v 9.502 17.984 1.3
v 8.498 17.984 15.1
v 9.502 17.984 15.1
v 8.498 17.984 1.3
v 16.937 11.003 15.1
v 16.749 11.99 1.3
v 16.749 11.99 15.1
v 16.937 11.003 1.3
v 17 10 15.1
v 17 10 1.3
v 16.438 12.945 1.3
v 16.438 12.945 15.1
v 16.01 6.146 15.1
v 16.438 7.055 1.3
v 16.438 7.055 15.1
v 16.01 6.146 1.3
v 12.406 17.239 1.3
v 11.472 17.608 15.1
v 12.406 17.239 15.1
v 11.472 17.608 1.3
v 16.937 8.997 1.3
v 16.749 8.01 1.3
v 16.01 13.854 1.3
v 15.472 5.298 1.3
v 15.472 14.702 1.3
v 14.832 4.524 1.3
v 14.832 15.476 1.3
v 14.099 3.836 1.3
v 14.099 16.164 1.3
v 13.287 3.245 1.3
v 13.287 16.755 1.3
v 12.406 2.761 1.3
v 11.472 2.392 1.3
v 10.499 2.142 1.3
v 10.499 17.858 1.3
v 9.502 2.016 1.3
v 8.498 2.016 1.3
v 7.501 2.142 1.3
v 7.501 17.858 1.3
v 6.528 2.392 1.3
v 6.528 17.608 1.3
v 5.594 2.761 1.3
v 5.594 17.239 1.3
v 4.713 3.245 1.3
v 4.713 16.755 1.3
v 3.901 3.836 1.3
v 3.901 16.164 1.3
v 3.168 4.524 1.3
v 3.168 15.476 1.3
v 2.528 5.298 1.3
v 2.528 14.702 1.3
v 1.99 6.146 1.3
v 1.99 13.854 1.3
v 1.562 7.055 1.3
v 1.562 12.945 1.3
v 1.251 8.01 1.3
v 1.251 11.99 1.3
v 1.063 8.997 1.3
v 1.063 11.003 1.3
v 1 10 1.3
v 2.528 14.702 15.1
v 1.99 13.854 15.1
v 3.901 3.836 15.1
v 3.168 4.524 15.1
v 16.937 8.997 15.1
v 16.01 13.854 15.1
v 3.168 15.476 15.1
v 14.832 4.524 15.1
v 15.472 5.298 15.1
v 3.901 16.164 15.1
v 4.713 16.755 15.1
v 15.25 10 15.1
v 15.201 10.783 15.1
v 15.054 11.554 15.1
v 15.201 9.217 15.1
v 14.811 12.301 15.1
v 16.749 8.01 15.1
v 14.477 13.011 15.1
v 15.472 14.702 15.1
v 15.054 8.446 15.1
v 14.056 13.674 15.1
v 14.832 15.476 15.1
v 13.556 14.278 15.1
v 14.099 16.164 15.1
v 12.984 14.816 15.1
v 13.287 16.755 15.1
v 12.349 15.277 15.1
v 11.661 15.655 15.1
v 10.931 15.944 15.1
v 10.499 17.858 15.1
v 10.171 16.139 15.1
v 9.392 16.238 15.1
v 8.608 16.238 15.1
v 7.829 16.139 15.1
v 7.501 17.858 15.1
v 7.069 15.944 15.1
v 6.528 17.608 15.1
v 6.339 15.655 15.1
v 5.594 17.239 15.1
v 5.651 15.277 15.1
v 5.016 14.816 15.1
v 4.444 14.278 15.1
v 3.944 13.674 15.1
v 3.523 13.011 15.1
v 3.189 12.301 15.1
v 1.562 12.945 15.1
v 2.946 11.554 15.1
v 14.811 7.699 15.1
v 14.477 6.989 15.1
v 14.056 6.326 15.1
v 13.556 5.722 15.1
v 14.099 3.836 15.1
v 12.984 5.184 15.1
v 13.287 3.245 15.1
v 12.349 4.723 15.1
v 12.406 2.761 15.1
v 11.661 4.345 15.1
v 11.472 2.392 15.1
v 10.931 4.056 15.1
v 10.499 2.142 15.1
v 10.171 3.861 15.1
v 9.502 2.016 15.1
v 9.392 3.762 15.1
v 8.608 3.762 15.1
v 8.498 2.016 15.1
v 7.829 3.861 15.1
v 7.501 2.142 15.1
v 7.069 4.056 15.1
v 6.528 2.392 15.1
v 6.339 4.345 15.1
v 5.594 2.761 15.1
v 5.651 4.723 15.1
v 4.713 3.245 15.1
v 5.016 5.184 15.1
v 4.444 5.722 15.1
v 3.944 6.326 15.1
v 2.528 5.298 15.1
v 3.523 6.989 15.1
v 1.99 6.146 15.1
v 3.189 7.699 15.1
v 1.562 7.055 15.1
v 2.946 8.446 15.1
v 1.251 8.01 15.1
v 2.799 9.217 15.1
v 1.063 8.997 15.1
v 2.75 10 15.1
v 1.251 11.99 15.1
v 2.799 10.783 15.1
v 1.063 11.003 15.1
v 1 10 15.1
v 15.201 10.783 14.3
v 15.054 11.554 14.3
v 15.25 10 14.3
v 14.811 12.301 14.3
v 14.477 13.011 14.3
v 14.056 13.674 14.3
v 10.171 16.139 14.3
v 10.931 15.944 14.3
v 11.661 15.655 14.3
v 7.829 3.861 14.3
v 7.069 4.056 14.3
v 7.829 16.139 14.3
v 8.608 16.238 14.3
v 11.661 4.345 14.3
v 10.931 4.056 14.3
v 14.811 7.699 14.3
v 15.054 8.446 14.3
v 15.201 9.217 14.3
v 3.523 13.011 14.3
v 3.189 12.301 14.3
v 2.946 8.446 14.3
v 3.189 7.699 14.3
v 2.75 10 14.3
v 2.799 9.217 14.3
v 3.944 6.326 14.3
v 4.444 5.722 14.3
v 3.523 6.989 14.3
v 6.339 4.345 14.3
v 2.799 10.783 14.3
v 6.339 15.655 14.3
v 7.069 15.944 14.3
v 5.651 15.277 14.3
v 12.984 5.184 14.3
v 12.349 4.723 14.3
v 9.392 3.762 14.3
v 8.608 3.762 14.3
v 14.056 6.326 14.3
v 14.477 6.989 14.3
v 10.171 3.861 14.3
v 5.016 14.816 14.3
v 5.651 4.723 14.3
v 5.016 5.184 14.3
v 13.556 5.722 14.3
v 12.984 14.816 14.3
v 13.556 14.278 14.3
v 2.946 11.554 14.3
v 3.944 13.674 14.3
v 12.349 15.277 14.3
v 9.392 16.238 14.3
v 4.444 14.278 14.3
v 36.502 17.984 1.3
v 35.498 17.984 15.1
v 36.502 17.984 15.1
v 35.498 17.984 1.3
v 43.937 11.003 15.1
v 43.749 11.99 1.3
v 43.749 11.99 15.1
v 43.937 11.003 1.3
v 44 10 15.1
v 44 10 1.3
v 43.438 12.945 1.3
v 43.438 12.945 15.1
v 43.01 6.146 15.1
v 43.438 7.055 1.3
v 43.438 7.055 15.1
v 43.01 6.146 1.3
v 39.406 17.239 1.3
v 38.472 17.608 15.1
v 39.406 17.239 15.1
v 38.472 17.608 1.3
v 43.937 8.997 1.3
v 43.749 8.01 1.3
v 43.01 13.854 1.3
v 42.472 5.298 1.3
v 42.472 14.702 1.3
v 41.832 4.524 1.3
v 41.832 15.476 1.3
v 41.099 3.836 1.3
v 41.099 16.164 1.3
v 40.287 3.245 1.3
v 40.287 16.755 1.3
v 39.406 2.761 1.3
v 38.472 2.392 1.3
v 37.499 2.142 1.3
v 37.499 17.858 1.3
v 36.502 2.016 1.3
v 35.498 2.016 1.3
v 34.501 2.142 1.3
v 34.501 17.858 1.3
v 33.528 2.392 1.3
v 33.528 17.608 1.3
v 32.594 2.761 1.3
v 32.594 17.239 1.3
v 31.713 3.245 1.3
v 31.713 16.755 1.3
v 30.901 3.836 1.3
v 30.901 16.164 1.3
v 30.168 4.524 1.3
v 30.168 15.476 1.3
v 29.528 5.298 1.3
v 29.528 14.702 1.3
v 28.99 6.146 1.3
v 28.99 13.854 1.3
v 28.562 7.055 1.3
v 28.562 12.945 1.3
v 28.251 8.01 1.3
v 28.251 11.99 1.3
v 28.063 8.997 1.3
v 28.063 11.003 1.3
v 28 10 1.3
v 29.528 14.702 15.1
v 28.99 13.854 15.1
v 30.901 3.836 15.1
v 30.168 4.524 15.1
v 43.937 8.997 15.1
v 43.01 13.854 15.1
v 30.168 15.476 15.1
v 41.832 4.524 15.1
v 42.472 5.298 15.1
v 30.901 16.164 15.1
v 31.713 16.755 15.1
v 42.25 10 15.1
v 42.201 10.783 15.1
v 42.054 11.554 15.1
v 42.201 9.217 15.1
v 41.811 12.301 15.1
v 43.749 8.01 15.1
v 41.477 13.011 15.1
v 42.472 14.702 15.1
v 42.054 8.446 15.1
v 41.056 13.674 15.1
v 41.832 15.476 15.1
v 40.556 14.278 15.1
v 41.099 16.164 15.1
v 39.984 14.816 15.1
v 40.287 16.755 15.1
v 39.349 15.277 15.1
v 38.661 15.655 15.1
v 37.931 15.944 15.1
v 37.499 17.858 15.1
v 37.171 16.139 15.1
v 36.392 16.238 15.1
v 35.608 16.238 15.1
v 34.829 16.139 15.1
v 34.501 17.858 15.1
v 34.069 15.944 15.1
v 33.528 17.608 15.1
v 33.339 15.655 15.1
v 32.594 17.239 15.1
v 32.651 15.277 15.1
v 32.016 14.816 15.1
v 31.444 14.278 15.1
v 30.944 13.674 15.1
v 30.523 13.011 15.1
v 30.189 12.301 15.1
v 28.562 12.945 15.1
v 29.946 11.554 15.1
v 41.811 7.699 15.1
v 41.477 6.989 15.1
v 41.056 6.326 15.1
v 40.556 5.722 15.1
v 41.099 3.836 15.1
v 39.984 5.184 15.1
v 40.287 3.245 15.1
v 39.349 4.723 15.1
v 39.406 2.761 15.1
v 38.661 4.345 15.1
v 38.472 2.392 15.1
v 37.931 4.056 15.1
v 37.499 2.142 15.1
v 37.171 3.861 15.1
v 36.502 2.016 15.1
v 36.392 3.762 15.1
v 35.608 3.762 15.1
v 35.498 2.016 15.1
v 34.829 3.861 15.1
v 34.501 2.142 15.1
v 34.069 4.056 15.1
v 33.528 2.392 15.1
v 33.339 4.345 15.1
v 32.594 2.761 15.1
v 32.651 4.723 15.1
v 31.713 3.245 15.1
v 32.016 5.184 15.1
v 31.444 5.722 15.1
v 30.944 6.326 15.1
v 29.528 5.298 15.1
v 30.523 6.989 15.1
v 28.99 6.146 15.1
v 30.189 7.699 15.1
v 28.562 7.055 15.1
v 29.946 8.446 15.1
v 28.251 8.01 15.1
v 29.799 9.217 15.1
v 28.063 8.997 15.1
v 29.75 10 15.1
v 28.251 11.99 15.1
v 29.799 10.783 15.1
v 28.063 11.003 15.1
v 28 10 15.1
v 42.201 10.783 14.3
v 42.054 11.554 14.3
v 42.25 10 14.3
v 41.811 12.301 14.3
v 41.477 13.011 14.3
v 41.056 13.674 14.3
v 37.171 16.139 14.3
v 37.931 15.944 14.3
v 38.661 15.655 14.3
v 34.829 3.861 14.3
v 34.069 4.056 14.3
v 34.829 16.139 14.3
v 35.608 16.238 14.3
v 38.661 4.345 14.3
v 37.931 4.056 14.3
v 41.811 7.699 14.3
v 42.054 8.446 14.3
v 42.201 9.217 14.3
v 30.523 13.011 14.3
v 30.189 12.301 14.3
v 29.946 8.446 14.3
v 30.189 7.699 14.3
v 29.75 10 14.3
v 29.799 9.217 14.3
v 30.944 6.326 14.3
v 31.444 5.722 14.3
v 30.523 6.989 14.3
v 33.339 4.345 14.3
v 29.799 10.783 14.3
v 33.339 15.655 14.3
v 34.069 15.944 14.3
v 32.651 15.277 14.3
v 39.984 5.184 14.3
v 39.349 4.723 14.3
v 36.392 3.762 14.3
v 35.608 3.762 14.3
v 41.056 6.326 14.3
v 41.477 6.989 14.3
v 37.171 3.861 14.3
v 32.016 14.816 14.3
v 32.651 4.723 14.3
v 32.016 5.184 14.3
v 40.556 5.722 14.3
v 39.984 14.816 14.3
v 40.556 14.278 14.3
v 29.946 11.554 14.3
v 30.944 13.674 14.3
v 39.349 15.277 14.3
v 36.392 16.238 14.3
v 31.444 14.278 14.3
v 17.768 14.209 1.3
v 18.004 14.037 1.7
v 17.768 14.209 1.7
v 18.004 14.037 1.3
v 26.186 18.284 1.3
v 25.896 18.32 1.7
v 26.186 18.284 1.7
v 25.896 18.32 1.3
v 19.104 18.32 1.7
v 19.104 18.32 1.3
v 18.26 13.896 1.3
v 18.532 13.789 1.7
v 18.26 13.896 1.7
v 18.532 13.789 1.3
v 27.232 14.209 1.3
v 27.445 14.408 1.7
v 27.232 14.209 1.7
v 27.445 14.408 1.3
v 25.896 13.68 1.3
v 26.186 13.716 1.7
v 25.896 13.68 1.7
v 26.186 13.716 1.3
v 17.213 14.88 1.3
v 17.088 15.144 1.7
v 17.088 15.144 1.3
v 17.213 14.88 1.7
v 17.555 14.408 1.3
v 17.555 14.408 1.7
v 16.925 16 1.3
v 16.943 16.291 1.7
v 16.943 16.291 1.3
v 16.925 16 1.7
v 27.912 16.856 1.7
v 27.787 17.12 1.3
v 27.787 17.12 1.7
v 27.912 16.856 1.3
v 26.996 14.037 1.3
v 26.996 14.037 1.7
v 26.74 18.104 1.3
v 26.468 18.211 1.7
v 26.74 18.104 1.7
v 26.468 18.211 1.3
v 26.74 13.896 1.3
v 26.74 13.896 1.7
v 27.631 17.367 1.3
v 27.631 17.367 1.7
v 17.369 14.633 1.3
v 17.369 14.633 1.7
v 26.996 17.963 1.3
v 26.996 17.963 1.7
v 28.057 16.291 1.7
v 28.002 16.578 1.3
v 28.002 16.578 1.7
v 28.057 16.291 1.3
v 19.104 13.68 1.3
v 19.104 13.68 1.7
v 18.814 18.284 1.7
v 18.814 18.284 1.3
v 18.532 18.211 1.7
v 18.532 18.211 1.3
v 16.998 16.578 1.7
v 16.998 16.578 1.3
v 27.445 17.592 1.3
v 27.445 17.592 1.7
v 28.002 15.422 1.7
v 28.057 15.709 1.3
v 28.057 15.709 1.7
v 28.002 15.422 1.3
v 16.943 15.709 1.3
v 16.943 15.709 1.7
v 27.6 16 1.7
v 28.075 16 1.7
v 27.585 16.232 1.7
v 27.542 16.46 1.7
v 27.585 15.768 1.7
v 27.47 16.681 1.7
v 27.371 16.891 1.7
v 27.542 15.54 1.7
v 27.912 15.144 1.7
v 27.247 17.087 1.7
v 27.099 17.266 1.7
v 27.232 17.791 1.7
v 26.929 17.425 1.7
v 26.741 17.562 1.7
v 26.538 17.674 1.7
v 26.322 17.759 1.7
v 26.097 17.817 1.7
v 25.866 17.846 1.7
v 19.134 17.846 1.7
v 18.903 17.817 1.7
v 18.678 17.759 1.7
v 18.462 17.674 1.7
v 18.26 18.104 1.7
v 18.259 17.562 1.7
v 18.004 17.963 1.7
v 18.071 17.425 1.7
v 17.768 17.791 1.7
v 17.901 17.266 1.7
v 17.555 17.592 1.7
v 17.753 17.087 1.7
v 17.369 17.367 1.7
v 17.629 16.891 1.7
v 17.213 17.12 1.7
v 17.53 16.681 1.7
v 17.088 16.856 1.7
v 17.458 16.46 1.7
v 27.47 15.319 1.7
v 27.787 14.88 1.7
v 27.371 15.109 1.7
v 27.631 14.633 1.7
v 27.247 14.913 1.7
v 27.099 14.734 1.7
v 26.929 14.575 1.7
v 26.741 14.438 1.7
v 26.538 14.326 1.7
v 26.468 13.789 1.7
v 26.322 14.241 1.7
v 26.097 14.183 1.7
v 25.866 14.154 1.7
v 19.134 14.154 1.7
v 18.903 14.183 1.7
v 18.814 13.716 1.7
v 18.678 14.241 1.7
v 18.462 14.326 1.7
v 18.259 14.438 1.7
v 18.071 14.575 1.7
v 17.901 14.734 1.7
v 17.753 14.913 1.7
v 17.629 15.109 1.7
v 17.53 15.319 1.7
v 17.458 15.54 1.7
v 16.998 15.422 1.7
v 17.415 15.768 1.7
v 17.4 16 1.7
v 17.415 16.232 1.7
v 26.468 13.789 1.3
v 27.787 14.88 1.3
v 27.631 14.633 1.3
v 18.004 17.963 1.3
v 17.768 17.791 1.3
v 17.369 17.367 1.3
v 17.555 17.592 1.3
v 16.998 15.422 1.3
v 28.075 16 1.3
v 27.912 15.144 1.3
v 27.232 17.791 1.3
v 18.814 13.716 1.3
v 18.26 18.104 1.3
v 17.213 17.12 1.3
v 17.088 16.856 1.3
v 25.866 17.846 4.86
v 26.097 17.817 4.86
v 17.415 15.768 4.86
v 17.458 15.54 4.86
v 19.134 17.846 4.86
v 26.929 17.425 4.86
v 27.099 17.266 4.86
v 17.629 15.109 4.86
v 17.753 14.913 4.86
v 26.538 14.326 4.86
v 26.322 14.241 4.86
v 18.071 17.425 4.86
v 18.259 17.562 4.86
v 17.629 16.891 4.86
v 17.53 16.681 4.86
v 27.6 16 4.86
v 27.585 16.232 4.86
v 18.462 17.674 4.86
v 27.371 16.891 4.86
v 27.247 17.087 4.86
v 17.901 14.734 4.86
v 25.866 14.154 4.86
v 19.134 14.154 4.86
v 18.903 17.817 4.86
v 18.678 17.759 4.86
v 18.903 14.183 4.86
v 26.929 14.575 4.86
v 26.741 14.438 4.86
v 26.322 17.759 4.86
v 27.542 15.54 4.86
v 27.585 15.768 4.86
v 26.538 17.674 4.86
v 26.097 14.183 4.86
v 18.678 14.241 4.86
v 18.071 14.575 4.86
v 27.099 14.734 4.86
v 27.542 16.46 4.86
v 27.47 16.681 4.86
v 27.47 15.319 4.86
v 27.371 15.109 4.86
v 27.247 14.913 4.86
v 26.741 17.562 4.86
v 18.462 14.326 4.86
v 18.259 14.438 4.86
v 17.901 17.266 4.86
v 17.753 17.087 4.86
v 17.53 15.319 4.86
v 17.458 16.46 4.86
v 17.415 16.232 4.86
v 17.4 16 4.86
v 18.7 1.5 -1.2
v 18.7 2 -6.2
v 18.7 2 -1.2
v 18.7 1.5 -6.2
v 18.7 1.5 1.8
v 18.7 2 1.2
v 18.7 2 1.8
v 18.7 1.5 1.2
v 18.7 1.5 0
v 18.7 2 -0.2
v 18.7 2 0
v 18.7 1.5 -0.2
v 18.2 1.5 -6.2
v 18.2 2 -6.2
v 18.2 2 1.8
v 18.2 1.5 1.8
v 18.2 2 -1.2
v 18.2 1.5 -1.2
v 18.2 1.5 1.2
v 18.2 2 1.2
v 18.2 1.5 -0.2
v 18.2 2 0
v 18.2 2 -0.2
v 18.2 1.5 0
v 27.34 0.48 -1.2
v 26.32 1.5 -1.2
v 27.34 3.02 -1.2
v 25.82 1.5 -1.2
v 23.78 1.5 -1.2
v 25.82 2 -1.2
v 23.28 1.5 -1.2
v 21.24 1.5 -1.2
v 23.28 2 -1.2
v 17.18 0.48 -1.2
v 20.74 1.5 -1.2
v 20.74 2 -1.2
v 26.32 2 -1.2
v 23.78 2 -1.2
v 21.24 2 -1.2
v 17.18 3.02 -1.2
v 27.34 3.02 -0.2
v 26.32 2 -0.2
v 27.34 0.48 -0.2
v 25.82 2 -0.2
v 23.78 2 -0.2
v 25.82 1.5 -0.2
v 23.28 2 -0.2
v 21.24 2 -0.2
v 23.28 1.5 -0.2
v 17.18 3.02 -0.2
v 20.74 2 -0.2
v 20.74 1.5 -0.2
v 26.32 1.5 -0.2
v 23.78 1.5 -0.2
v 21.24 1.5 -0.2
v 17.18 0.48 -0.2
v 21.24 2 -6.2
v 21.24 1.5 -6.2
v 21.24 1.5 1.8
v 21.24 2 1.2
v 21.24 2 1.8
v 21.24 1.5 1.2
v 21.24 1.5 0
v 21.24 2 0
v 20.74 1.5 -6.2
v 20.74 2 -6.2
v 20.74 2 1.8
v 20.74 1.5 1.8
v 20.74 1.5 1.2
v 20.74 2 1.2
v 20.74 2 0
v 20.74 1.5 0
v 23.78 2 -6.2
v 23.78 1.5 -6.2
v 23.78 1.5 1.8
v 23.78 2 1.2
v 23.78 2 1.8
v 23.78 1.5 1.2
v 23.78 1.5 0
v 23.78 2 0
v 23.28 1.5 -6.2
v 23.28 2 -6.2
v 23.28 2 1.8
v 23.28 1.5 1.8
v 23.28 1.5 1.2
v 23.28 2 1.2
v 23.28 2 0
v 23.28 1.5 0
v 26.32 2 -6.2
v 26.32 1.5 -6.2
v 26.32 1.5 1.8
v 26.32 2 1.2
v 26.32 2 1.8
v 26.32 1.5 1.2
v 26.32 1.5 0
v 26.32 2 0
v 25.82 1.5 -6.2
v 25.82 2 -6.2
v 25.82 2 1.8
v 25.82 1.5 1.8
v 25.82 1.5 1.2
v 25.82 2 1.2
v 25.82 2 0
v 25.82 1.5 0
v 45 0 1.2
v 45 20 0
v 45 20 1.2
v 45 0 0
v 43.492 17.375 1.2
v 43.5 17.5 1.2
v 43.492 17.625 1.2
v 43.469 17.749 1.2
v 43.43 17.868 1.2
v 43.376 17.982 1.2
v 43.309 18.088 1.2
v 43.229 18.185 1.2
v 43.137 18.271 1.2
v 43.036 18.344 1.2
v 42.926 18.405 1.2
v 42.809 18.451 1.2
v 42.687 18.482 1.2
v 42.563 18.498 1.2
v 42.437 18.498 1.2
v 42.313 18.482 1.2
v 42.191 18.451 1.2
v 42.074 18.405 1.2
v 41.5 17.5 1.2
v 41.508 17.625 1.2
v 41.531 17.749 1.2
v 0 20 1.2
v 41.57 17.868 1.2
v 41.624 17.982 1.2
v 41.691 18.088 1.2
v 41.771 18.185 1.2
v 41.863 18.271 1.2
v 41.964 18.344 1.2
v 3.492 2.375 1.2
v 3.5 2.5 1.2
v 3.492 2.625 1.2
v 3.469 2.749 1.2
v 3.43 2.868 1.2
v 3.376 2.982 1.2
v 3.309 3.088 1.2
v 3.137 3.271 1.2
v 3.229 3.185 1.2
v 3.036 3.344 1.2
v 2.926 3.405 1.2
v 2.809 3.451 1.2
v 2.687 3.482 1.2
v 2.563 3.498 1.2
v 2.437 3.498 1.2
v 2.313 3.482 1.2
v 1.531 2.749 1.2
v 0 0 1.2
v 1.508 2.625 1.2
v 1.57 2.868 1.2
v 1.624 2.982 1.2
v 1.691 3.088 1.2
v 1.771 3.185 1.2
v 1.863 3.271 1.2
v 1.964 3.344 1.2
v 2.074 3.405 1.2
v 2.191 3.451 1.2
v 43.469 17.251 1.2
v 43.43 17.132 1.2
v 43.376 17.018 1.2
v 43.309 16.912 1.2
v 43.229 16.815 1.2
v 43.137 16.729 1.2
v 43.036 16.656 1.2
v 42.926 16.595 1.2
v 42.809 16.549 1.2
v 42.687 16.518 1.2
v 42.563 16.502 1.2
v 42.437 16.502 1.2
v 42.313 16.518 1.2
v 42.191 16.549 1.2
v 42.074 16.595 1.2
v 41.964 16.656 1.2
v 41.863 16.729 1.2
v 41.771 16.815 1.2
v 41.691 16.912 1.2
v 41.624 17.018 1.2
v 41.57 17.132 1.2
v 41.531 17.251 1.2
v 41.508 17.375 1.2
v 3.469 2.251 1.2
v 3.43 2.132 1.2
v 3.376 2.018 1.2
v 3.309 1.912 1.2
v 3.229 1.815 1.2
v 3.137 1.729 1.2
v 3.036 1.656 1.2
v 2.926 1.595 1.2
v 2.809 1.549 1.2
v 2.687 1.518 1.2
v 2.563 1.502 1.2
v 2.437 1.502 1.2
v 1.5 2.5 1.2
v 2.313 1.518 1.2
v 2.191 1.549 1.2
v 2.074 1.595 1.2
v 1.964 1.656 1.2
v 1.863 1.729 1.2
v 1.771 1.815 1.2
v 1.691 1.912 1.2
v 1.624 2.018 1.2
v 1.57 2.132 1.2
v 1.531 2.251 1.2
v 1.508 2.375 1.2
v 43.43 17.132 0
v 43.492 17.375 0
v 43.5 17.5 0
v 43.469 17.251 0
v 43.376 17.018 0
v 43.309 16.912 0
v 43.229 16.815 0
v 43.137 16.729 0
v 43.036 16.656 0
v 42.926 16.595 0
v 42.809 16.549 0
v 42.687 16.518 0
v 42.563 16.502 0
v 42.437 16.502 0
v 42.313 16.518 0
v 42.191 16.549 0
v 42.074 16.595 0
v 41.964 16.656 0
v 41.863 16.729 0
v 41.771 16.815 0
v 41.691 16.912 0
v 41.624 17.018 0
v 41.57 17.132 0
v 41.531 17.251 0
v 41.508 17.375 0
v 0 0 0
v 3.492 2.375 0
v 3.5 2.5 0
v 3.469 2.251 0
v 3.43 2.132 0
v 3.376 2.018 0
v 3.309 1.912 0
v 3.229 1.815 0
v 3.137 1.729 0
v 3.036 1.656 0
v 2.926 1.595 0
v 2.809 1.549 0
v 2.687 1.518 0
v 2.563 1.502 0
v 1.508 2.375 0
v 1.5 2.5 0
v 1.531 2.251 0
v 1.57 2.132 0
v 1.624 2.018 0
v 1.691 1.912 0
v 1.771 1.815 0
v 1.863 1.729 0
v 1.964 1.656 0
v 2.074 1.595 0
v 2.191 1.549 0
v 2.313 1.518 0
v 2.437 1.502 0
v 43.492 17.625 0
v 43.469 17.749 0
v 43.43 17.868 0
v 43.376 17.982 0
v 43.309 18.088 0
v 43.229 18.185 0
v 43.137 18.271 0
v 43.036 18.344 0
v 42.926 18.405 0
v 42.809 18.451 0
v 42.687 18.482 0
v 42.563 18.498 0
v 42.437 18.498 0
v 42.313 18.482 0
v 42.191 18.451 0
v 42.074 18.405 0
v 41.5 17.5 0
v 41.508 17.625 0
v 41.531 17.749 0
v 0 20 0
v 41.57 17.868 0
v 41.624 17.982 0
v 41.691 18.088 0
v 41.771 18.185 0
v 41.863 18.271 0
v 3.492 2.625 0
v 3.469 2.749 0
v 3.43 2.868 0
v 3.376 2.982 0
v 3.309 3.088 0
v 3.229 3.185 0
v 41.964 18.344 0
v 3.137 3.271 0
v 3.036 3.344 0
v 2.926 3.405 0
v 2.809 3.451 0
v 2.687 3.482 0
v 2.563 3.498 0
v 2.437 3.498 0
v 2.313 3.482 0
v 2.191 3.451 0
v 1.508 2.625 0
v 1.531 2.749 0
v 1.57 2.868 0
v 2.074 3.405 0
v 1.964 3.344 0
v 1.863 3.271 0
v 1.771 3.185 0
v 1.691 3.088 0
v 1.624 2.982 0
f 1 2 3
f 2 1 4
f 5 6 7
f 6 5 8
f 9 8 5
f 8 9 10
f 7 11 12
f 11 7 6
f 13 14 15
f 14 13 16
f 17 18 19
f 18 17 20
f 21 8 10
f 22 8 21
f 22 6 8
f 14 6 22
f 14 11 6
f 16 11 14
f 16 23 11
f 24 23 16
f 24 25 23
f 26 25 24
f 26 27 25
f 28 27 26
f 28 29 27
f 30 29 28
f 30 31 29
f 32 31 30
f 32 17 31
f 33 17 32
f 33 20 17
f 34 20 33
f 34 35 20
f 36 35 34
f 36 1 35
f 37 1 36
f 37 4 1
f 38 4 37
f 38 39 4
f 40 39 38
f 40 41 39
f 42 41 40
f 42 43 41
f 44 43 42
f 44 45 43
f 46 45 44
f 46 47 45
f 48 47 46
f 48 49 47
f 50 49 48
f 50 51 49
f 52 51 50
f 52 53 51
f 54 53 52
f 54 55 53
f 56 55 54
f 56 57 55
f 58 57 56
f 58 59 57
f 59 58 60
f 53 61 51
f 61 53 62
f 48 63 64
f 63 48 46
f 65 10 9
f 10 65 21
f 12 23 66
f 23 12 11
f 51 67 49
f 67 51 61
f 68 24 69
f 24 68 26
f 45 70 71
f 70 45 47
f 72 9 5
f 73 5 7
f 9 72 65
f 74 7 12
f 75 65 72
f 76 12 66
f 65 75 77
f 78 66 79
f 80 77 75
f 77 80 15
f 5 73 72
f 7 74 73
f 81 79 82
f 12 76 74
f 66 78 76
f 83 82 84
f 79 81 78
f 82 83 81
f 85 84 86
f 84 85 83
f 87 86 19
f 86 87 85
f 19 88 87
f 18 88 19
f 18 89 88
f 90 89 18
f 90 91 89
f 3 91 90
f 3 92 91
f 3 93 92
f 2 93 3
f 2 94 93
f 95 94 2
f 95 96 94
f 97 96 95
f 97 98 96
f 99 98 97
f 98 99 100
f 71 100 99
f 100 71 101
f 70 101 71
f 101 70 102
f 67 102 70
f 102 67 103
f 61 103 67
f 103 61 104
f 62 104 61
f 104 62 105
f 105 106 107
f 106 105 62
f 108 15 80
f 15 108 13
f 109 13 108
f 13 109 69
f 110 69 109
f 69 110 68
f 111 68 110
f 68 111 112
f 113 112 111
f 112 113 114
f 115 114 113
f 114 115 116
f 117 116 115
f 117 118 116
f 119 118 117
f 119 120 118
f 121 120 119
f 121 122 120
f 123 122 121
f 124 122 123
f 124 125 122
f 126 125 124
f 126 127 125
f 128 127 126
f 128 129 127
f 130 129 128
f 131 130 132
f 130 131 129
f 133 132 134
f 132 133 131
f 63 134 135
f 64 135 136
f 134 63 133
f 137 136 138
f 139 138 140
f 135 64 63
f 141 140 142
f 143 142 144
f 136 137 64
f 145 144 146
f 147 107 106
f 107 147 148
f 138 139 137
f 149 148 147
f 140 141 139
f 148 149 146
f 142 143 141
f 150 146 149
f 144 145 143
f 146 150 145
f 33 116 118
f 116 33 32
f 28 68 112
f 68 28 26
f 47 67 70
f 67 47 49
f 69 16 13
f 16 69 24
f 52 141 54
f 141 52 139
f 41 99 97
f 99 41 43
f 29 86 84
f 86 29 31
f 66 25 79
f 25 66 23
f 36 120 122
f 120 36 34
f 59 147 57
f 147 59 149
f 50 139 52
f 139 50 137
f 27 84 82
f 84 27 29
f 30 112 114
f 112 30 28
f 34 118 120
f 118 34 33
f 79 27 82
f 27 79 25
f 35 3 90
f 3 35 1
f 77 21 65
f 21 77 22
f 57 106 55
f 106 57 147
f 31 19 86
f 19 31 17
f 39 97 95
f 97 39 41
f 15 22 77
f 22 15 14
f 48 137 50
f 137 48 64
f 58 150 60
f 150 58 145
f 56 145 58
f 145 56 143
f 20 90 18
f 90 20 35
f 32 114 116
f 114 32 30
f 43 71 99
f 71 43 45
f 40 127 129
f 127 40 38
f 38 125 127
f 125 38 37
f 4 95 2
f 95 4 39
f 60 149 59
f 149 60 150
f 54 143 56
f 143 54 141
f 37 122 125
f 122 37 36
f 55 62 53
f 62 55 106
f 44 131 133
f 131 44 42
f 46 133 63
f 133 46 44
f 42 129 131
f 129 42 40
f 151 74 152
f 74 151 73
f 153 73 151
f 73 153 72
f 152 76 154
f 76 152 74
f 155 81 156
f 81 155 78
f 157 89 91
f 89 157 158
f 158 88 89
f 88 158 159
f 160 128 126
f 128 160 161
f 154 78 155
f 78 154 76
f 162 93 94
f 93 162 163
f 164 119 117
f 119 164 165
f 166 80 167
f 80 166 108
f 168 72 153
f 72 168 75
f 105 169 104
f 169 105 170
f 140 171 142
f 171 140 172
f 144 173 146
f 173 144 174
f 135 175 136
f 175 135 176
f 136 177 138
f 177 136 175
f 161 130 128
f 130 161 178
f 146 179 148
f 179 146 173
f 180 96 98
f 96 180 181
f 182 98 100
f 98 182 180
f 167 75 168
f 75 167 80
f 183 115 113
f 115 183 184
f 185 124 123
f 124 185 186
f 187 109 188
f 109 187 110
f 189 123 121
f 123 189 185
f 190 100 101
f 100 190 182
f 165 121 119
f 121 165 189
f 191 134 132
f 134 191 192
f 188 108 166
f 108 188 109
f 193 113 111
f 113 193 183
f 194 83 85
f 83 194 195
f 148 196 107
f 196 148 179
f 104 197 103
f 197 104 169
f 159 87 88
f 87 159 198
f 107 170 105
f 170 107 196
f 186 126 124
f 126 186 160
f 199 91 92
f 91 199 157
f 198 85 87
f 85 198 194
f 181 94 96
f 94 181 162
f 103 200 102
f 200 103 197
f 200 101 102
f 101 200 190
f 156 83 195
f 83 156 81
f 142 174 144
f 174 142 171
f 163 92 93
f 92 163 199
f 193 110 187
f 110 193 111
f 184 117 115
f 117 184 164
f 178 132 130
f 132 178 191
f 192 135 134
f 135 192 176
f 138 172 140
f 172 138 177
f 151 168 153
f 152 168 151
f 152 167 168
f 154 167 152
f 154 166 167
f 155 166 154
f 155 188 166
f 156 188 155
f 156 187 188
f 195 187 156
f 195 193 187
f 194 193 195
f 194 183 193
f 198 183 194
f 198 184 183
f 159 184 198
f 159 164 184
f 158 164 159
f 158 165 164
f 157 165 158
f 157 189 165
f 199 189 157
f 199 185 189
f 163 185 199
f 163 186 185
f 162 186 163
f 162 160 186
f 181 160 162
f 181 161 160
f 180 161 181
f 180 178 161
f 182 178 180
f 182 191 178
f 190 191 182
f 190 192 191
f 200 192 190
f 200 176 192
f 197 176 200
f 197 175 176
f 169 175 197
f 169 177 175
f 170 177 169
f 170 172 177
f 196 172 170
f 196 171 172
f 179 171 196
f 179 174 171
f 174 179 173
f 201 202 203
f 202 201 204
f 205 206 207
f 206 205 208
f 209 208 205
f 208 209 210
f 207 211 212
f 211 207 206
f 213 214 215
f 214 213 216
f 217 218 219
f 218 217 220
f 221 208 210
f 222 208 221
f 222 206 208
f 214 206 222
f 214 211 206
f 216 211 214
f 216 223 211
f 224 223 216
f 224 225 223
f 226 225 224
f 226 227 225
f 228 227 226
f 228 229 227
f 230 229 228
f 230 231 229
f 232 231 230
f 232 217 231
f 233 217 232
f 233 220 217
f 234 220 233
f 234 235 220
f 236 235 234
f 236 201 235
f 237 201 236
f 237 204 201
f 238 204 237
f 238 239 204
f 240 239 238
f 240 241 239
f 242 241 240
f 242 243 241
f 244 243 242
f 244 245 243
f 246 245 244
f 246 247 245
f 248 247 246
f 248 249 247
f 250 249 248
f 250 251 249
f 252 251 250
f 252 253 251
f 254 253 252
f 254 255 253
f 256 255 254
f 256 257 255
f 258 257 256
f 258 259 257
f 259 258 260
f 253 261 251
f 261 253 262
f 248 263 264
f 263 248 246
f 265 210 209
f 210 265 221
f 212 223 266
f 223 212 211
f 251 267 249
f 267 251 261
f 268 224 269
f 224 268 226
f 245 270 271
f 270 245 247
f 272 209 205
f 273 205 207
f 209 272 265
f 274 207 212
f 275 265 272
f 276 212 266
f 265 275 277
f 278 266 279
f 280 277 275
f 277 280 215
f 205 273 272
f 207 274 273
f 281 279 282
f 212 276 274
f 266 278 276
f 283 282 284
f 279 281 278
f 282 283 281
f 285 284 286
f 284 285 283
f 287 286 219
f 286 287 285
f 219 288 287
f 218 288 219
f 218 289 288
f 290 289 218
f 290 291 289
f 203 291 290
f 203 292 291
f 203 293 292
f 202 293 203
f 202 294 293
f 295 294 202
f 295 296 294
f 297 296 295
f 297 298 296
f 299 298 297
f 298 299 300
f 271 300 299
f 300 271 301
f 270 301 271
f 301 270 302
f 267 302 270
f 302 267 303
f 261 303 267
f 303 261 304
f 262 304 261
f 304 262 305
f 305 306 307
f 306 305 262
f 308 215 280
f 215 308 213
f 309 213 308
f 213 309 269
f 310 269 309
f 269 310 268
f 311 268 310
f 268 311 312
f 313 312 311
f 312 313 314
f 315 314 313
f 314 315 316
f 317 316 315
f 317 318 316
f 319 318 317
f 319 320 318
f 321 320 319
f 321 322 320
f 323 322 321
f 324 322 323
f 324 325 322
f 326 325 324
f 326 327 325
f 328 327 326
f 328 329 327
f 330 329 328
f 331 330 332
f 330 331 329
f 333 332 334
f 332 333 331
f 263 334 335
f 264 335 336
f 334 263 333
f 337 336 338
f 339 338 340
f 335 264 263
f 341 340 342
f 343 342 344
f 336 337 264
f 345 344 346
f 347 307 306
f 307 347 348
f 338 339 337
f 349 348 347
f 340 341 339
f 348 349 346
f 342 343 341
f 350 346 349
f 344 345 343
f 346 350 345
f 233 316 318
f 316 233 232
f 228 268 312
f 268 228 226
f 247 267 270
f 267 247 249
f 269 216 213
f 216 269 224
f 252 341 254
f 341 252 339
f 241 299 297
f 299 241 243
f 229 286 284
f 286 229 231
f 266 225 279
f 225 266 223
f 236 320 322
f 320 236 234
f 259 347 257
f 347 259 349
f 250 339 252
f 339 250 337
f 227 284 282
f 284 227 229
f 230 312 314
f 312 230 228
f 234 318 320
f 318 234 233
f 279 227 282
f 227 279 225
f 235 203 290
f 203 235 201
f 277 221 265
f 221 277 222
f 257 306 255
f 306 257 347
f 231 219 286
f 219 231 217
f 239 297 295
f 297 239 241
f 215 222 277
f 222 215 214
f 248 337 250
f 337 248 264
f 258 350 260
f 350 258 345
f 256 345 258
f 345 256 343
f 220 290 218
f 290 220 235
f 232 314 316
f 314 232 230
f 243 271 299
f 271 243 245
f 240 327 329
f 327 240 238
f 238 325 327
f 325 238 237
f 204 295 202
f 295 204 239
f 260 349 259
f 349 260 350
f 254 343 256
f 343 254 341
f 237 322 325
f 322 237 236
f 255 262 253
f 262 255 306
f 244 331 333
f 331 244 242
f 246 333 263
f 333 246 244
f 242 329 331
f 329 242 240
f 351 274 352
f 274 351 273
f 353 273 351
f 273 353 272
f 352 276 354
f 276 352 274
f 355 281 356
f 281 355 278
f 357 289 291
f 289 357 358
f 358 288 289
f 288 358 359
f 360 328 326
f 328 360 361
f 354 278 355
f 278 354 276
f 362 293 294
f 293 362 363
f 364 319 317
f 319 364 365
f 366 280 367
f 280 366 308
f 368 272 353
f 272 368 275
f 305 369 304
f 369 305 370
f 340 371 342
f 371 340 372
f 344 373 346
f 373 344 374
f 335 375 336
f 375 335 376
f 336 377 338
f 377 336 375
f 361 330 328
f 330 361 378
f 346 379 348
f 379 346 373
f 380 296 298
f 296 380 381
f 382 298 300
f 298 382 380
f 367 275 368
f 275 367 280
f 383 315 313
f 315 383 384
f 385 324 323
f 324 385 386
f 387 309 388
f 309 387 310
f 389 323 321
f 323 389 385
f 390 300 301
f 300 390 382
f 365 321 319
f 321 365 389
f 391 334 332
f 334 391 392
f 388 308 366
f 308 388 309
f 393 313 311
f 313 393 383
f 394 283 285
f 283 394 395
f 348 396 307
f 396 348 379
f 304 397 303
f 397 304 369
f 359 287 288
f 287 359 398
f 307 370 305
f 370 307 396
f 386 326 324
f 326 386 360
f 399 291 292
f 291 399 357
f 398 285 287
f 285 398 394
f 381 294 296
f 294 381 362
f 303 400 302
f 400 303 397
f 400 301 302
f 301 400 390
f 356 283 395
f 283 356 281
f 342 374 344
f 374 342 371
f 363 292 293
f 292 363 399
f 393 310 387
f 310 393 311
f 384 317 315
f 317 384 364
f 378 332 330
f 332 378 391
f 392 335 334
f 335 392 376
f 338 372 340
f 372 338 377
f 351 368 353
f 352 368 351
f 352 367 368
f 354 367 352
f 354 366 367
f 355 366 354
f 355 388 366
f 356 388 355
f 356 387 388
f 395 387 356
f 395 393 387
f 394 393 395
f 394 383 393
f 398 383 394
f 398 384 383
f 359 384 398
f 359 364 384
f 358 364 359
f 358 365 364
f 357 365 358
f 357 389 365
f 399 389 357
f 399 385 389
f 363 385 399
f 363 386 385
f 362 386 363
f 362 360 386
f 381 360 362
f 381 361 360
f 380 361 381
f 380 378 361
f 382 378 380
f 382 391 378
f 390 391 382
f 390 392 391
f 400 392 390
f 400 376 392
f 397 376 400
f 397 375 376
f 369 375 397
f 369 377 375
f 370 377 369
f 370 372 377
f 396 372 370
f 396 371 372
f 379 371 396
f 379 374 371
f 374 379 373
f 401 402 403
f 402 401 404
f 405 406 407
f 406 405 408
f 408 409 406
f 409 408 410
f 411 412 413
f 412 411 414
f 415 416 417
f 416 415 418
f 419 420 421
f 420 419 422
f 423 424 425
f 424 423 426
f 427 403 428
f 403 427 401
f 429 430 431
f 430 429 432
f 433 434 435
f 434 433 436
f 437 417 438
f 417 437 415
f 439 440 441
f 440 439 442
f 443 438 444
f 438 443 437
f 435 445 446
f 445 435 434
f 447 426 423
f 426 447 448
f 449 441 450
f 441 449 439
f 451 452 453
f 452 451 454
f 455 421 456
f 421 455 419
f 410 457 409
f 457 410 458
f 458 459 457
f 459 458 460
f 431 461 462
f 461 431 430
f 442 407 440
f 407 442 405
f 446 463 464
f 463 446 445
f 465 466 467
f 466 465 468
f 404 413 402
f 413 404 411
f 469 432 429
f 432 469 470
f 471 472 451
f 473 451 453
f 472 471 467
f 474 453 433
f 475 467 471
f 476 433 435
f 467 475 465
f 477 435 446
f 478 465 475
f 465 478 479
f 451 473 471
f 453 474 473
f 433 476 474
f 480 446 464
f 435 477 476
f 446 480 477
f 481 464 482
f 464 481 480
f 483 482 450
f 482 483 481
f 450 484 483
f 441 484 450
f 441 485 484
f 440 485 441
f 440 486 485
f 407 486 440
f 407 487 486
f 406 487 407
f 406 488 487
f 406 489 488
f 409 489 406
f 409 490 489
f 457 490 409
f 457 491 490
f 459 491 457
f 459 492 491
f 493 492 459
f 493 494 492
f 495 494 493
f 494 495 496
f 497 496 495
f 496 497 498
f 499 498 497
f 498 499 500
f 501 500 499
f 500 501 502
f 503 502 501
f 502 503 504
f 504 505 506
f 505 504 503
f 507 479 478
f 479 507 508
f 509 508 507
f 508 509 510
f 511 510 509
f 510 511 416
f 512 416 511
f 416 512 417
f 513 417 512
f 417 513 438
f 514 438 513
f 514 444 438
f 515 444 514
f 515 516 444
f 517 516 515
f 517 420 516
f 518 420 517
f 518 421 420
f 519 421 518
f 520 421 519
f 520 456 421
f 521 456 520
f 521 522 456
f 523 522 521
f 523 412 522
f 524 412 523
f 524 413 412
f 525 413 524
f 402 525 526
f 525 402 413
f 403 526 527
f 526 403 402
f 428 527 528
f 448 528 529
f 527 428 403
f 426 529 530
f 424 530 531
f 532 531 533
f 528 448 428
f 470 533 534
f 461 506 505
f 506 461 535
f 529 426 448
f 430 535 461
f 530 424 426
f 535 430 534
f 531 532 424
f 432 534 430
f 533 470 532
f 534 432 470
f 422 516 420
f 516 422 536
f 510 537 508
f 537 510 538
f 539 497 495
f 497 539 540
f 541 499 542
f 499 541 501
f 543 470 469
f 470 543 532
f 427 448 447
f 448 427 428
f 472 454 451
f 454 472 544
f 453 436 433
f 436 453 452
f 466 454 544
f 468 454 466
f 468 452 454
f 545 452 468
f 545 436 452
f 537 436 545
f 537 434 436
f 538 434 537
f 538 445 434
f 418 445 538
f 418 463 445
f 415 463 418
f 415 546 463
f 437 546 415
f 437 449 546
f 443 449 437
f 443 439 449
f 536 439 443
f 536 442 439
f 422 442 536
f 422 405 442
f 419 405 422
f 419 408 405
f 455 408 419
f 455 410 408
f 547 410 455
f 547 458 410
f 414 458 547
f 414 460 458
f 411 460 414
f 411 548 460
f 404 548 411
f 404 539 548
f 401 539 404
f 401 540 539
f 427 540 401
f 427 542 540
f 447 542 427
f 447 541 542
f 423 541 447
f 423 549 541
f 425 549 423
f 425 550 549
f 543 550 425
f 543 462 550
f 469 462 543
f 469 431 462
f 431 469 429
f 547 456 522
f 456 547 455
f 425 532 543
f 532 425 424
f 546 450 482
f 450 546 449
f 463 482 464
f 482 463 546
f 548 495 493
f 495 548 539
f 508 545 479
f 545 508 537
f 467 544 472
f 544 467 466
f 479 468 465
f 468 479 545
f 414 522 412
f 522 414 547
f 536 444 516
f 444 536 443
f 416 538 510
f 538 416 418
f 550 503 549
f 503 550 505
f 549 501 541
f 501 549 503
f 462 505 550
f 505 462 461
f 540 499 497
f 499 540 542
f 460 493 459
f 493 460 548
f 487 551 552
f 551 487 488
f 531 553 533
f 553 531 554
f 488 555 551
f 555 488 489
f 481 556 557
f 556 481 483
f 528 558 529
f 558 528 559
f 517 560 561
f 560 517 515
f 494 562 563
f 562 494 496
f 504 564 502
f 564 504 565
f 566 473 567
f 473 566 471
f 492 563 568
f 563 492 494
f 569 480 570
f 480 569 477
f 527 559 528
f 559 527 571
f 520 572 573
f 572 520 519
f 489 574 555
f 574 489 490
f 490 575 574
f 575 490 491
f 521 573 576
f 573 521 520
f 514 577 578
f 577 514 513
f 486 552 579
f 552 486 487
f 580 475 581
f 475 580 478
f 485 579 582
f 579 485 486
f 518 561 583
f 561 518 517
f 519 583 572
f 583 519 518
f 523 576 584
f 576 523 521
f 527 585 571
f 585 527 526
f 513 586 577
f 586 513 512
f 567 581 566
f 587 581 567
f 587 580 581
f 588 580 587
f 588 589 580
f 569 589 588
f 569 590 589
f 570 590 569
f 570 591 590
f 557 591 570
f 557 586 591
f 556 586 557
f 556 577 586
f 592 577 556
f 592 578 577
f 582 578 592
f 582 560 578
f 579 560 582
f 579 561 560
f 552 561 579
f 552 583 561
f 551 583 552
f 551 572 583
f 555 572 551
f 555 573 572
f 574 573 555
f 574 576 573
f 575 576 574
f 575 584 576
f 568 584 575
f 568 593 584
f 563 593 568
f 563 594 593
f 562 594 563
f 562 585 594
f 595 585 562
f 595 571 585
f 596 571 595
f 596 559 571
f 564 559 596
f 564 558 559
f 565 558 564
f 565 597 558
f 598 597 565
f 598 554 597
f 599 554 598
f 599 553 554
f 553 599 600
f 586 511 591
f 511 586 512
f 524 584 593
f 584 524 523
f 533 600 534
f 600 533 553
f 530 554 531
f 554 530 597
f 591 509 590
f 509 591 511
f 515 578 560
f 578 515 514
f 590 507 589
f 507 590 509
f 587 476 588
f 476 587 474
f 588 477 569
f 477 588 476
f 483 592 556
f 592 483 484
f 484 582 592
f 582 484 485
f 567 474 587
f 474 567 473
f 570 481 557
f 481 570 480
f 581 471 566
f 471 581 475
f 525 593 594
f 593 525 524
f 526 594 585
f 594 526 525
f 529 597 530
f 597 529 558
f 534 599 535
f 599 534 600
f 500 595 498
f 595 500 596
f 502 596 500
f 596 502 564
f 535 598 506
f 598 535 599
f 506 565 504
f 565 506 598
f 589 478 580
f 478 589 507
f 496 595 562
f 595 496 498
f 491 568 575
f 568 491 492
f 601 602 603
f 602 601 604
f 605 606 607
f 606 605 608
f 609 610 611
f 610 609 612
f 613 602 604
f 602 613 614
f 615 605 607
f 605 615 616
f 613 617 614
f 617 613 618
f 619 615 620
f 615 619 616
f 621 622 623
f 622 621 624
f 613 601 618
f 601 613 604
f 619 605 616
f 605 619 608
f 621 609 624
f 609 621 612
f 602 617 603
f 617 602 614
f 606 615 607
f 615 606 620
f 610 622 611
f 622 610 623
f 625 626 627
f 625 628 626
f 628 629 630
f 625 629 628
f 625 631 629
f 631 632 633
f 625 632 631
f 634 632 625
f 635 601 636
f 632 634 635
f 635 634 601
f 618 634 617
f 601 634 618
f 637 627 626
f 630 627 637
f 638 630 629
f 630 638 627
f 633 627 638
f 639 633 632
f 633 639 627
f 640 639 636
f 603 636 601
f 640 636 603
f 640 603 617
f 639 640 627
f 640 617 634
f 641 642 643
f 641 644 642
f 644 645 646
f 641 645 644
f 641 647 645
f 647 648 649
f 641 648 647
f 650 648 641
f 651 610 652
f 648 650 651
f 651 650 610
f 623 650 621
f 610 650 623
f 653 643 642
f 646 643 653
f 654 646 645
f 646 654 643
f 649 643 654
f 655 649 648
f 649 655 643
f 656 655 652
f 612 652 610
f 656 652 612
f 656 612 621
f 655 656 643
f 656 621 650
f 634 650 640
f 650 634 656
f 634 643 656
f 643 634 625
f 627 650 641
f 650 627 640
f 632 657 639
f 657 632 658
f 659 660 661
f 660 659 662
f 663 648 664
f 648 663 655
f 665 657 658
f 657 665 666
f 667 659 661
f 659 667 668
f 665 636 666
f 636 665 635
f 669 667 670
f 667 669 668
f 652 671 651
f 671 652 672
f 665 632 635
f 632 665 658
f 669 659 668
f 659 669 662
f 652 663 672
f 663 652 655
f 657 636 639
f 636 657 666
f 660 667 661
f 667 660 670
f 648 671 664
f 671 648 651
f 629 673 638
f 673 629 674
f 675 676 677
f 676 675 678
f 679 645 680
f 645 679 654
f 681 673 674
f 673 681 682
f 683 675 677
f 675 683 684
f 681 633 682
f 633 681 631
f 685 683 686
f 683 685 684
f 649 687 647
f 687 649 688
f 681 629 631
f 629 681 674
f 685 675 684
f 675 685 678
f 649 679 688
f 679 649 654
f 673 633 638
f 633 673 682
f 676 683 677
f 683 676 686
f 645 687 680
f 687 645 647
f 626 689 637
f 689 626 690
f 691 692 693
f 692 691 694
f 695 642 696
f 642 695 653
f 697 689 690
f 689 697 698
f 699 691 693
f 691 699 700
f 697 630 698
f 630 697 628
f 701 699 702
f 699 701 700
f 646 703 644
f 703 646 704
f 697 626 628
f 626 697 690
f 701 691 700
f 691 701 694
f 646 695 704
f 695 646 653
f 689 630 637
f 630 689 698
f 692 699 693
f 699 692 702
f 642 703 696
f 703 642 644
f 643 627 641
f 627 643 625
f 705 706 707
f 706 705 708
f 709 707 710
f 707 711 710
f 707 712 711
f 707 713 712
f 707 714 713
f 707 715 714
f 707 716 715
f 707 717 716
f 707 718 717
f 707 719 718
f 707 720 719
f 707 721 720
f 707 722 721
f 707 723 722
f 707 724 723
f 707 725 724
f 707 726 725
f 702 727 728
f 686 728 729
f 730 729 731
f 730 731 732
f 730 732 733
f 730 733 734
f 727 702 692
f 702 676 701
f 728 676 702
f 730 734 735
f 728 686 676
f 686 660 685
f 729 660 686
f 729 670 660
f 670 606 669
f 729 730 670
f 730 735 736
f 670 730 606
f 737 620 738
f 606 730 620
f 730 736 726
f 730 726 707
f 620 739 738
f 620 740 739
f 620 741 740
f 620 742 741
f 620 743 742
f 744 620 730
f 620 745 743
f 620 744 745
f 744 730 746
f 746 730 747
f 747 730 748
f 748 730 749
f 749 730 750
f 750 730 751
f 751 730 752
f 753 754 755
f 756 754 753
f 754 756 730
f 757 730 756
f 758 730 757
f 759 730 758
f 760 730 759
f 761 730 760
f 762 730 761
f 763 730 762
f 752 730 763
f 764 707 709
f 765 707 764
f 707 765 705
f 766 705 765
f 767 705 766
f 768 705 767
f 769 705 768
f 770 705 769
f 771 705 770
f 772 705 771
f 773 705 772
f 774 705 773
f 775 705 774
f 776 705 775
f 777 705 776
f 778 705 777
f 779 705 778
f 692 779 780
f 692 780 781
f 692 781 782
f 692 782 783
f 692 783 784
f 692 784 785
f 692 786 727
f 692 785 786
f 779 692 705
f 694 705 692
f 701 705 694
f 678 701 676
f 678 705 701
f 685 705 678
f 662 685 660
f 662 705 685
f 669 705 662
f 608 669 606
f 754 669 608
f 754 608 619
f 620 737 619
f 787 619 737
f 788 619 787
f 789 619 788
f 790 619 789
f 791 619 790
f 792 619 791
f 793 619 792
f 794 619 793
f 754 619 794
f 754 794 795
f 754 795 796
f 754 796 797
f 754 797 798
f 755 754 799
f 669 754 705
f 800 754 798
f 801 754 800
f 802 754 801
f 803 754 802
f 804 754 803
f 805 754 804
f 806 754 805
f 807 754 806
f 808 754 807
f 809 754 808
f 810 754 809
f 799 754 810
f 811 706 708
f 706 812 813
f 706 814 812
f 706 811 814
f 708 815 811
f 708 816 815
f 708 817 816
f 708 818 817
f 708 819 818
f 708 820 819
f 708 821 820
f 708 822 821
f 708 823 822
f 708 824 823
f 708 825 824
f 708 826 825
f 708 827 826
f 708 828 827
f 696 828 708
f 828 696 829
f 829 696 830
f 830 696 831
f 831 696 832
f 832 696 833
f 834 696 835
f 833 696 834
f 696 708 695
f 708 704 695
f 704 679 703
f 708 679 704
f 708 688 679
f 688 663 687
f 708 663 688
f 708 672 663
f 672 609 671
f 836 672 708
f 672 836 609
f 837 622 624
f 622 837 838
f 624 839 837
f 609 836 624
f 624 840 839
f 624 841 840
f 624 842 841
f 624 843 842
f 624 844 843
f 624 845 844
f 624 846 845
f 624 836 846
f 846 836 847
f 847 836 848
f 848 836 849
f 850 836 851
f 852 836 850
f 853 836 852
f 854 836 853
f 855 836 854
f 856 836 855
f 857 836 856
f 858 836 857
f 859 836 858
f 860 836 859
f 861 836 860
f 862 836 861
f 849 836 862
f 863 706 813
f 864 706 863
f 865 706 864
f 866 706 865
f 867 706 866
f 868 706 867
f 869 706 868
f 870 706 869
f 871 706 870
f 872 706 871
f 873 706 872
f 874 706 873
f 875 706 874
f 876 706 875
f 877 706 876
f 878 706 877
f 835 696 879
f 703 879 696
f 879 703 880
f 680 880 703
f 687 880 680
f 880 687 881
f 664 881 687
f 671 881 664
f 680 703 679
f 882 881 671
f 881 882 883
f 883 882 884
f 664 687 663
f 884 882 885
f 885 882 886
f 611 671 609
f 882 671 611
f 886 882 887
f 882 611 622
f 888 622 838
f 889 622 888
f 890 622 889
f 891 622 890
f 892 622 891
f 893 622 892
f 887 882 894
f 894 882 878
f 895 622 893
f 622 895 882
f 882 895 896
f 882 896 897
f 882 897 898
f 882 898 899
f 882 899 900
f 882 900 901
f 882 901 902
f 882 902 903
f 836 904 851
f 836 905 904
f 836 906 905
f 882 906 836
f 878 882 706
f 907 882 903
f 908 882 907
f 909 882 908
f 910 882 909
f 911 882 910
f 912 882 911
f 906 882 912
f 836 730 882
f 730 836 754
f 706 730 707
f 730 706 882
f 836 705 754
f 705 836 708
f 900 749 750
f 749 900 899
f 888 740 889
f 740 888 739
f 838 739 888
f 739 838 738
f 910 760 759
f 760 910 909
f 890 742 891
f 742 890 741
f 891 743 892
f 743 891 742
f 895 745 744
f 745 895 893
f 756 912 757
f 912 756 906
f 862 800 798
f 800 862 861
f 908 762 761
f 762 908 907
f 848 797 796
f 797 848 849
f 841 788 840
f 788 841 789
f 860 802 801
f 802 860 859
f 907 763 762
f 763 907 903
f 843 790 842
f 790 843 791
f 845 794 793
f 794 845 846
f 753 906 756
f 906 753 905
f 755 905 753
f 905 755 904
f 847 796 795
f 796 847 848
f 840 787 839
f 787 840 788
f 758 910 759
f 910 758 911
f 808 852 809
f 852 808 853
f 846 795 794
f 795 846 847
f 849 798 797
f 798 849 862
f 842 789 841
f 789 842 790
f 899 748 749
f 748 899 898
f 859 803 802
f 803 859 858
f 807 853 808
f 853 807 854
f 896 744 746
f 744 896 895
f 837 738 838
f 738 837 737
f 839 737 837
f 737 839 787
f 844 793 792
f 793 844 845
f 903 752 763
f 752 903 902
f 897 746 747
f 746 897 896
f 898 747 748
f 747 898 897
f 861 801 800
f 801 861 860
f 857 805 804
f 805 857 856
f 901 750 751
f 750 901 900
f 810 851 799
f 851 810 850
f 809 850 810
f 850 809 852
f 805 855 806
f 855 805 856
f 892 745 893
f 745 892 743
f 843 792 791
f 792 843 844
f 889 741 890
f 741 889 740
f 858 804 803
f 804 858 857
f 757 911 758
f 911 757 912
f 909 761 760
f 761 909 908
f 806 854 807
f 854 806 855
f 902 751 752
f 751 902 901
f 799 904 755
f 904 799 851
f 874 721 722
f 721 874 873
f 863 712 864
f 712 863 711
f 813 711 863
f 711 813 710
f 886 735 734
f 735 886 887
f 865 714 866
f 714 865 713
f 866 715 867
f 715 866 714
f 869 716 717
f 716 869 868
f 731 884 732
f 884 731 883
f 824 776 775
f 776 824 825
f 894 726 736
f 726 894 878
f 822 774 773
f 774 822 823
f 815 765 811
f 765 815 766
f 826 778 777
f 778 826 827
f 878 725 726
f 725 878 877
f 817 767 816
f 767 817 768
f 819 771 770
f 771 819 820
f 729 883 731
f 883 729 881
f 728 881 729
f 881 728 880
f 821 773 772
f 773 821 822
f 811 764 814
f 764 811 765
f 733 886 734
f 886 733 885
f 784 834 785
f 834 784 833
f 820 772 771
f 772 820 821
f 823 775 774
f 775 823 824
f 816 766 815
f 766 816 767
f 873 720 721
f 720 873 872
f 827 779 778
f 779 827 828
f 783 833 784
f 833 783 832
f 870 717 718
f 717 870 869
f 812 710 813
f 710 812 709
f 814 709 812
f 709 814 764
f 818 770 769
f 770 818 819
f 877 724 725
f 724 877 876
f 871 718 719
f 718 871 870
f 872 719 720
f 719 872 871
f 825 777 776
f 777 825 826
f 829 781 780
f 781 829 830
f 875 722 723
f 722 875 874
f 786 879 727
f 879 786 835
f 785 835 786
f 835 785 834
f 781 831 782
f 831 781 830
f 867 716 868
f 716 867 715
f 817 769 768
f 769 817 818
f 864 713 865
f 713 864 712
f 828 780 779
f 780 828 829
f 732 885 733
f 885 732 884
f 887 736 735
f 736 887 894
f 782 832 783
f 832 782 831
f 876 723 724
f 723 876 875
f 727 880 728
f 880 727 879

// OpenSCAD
//HC-SR04 Ultrasonic distance sensor module

//Mark Benson

//23/07/2013

//Creative Commons non commercial

difference()
{
	union()
	{
		color("DARKBLUE")cube([45,20,1.2]);
		translate([16/2+1,18/2+1,1.3]) ultrasonicSensor();
		translate([16/2+27+1,18/2+1,1.3]) ultrasonicSensor();
		color("SILVER")translate([45/2-3.25,20-4,1.3]) xtal();
		translate([(45/2)-((2.45*4)/2)+0.6,2,-0.2]) rotate([180,0,0]) headerPin(4);
	}

	union()
	{
		color("DARKBLUE") translate([2.5,2.5,-1]) cylinder(r=2/2, h=3, $fn=50);
		color("DARKBLUE") translate([2.5+40,2.5+15,-1]) cylinder(r=2/2, h=3, $fn=50);
	}
}

module ultrasonicSensor()
{
	union()
	{
		//Sensor body
		color("SILVER")
		difference()
		{
			//Body
			translate([0,0,0]) cylinder(r=16/2, h=13.8, $fn=50);
			//Hole in body
			translate([0,0,0]) cylinder(r=12.5/2, h=14, $fn=50);
		}

		//Insert to indicate mesh
		color("GREY") translate([0,0,0]) cylinder(r=12.5/2, h=13, $fn=50);
	}
}

//ultrasonicSensor(); 

module xtal()
{
	//Xtal maximum dimensions for checking model
	//color("red")translate([0,0,-1]) cube([11.5,4.65,1]);
	//color("red")translate([(11.54-10.3)/2,(4.65-3.8)/2,0]) cube([10.3,3.8,3.56]);
	
	union()
	{
		//Base
		hull()
		{
			translate([0,0,0]) cylinder(r=4.65/2, h=0.4, $fn=50);
			translate([6.5,0,0]) cylinder(r=4.65/2, h=0.4, $fn=50);
		}
	
		//Body
		hull()
		{
			translate([0,0,0]) cylinder(r=3.7/2, h=3.56, $fn=50);
			translate([6.5,0,0]) cylinder(r=3.7/2, h=3.56, $fn=50);
		}
	}
}

module headerPin(numberOfPins)
{
	for (i = [0:numberOfPins-1])
	{
		color("GOLD") translate([(i*2.54),0,-2]) cube([0.5,0.5,8]);
		color("BLACK") translate([(i*2.54-2.54/2+0.25),-2.54/2+0.25,0]) cube([2.54,2.54,1]);
	}
}

//headerPin(4);
